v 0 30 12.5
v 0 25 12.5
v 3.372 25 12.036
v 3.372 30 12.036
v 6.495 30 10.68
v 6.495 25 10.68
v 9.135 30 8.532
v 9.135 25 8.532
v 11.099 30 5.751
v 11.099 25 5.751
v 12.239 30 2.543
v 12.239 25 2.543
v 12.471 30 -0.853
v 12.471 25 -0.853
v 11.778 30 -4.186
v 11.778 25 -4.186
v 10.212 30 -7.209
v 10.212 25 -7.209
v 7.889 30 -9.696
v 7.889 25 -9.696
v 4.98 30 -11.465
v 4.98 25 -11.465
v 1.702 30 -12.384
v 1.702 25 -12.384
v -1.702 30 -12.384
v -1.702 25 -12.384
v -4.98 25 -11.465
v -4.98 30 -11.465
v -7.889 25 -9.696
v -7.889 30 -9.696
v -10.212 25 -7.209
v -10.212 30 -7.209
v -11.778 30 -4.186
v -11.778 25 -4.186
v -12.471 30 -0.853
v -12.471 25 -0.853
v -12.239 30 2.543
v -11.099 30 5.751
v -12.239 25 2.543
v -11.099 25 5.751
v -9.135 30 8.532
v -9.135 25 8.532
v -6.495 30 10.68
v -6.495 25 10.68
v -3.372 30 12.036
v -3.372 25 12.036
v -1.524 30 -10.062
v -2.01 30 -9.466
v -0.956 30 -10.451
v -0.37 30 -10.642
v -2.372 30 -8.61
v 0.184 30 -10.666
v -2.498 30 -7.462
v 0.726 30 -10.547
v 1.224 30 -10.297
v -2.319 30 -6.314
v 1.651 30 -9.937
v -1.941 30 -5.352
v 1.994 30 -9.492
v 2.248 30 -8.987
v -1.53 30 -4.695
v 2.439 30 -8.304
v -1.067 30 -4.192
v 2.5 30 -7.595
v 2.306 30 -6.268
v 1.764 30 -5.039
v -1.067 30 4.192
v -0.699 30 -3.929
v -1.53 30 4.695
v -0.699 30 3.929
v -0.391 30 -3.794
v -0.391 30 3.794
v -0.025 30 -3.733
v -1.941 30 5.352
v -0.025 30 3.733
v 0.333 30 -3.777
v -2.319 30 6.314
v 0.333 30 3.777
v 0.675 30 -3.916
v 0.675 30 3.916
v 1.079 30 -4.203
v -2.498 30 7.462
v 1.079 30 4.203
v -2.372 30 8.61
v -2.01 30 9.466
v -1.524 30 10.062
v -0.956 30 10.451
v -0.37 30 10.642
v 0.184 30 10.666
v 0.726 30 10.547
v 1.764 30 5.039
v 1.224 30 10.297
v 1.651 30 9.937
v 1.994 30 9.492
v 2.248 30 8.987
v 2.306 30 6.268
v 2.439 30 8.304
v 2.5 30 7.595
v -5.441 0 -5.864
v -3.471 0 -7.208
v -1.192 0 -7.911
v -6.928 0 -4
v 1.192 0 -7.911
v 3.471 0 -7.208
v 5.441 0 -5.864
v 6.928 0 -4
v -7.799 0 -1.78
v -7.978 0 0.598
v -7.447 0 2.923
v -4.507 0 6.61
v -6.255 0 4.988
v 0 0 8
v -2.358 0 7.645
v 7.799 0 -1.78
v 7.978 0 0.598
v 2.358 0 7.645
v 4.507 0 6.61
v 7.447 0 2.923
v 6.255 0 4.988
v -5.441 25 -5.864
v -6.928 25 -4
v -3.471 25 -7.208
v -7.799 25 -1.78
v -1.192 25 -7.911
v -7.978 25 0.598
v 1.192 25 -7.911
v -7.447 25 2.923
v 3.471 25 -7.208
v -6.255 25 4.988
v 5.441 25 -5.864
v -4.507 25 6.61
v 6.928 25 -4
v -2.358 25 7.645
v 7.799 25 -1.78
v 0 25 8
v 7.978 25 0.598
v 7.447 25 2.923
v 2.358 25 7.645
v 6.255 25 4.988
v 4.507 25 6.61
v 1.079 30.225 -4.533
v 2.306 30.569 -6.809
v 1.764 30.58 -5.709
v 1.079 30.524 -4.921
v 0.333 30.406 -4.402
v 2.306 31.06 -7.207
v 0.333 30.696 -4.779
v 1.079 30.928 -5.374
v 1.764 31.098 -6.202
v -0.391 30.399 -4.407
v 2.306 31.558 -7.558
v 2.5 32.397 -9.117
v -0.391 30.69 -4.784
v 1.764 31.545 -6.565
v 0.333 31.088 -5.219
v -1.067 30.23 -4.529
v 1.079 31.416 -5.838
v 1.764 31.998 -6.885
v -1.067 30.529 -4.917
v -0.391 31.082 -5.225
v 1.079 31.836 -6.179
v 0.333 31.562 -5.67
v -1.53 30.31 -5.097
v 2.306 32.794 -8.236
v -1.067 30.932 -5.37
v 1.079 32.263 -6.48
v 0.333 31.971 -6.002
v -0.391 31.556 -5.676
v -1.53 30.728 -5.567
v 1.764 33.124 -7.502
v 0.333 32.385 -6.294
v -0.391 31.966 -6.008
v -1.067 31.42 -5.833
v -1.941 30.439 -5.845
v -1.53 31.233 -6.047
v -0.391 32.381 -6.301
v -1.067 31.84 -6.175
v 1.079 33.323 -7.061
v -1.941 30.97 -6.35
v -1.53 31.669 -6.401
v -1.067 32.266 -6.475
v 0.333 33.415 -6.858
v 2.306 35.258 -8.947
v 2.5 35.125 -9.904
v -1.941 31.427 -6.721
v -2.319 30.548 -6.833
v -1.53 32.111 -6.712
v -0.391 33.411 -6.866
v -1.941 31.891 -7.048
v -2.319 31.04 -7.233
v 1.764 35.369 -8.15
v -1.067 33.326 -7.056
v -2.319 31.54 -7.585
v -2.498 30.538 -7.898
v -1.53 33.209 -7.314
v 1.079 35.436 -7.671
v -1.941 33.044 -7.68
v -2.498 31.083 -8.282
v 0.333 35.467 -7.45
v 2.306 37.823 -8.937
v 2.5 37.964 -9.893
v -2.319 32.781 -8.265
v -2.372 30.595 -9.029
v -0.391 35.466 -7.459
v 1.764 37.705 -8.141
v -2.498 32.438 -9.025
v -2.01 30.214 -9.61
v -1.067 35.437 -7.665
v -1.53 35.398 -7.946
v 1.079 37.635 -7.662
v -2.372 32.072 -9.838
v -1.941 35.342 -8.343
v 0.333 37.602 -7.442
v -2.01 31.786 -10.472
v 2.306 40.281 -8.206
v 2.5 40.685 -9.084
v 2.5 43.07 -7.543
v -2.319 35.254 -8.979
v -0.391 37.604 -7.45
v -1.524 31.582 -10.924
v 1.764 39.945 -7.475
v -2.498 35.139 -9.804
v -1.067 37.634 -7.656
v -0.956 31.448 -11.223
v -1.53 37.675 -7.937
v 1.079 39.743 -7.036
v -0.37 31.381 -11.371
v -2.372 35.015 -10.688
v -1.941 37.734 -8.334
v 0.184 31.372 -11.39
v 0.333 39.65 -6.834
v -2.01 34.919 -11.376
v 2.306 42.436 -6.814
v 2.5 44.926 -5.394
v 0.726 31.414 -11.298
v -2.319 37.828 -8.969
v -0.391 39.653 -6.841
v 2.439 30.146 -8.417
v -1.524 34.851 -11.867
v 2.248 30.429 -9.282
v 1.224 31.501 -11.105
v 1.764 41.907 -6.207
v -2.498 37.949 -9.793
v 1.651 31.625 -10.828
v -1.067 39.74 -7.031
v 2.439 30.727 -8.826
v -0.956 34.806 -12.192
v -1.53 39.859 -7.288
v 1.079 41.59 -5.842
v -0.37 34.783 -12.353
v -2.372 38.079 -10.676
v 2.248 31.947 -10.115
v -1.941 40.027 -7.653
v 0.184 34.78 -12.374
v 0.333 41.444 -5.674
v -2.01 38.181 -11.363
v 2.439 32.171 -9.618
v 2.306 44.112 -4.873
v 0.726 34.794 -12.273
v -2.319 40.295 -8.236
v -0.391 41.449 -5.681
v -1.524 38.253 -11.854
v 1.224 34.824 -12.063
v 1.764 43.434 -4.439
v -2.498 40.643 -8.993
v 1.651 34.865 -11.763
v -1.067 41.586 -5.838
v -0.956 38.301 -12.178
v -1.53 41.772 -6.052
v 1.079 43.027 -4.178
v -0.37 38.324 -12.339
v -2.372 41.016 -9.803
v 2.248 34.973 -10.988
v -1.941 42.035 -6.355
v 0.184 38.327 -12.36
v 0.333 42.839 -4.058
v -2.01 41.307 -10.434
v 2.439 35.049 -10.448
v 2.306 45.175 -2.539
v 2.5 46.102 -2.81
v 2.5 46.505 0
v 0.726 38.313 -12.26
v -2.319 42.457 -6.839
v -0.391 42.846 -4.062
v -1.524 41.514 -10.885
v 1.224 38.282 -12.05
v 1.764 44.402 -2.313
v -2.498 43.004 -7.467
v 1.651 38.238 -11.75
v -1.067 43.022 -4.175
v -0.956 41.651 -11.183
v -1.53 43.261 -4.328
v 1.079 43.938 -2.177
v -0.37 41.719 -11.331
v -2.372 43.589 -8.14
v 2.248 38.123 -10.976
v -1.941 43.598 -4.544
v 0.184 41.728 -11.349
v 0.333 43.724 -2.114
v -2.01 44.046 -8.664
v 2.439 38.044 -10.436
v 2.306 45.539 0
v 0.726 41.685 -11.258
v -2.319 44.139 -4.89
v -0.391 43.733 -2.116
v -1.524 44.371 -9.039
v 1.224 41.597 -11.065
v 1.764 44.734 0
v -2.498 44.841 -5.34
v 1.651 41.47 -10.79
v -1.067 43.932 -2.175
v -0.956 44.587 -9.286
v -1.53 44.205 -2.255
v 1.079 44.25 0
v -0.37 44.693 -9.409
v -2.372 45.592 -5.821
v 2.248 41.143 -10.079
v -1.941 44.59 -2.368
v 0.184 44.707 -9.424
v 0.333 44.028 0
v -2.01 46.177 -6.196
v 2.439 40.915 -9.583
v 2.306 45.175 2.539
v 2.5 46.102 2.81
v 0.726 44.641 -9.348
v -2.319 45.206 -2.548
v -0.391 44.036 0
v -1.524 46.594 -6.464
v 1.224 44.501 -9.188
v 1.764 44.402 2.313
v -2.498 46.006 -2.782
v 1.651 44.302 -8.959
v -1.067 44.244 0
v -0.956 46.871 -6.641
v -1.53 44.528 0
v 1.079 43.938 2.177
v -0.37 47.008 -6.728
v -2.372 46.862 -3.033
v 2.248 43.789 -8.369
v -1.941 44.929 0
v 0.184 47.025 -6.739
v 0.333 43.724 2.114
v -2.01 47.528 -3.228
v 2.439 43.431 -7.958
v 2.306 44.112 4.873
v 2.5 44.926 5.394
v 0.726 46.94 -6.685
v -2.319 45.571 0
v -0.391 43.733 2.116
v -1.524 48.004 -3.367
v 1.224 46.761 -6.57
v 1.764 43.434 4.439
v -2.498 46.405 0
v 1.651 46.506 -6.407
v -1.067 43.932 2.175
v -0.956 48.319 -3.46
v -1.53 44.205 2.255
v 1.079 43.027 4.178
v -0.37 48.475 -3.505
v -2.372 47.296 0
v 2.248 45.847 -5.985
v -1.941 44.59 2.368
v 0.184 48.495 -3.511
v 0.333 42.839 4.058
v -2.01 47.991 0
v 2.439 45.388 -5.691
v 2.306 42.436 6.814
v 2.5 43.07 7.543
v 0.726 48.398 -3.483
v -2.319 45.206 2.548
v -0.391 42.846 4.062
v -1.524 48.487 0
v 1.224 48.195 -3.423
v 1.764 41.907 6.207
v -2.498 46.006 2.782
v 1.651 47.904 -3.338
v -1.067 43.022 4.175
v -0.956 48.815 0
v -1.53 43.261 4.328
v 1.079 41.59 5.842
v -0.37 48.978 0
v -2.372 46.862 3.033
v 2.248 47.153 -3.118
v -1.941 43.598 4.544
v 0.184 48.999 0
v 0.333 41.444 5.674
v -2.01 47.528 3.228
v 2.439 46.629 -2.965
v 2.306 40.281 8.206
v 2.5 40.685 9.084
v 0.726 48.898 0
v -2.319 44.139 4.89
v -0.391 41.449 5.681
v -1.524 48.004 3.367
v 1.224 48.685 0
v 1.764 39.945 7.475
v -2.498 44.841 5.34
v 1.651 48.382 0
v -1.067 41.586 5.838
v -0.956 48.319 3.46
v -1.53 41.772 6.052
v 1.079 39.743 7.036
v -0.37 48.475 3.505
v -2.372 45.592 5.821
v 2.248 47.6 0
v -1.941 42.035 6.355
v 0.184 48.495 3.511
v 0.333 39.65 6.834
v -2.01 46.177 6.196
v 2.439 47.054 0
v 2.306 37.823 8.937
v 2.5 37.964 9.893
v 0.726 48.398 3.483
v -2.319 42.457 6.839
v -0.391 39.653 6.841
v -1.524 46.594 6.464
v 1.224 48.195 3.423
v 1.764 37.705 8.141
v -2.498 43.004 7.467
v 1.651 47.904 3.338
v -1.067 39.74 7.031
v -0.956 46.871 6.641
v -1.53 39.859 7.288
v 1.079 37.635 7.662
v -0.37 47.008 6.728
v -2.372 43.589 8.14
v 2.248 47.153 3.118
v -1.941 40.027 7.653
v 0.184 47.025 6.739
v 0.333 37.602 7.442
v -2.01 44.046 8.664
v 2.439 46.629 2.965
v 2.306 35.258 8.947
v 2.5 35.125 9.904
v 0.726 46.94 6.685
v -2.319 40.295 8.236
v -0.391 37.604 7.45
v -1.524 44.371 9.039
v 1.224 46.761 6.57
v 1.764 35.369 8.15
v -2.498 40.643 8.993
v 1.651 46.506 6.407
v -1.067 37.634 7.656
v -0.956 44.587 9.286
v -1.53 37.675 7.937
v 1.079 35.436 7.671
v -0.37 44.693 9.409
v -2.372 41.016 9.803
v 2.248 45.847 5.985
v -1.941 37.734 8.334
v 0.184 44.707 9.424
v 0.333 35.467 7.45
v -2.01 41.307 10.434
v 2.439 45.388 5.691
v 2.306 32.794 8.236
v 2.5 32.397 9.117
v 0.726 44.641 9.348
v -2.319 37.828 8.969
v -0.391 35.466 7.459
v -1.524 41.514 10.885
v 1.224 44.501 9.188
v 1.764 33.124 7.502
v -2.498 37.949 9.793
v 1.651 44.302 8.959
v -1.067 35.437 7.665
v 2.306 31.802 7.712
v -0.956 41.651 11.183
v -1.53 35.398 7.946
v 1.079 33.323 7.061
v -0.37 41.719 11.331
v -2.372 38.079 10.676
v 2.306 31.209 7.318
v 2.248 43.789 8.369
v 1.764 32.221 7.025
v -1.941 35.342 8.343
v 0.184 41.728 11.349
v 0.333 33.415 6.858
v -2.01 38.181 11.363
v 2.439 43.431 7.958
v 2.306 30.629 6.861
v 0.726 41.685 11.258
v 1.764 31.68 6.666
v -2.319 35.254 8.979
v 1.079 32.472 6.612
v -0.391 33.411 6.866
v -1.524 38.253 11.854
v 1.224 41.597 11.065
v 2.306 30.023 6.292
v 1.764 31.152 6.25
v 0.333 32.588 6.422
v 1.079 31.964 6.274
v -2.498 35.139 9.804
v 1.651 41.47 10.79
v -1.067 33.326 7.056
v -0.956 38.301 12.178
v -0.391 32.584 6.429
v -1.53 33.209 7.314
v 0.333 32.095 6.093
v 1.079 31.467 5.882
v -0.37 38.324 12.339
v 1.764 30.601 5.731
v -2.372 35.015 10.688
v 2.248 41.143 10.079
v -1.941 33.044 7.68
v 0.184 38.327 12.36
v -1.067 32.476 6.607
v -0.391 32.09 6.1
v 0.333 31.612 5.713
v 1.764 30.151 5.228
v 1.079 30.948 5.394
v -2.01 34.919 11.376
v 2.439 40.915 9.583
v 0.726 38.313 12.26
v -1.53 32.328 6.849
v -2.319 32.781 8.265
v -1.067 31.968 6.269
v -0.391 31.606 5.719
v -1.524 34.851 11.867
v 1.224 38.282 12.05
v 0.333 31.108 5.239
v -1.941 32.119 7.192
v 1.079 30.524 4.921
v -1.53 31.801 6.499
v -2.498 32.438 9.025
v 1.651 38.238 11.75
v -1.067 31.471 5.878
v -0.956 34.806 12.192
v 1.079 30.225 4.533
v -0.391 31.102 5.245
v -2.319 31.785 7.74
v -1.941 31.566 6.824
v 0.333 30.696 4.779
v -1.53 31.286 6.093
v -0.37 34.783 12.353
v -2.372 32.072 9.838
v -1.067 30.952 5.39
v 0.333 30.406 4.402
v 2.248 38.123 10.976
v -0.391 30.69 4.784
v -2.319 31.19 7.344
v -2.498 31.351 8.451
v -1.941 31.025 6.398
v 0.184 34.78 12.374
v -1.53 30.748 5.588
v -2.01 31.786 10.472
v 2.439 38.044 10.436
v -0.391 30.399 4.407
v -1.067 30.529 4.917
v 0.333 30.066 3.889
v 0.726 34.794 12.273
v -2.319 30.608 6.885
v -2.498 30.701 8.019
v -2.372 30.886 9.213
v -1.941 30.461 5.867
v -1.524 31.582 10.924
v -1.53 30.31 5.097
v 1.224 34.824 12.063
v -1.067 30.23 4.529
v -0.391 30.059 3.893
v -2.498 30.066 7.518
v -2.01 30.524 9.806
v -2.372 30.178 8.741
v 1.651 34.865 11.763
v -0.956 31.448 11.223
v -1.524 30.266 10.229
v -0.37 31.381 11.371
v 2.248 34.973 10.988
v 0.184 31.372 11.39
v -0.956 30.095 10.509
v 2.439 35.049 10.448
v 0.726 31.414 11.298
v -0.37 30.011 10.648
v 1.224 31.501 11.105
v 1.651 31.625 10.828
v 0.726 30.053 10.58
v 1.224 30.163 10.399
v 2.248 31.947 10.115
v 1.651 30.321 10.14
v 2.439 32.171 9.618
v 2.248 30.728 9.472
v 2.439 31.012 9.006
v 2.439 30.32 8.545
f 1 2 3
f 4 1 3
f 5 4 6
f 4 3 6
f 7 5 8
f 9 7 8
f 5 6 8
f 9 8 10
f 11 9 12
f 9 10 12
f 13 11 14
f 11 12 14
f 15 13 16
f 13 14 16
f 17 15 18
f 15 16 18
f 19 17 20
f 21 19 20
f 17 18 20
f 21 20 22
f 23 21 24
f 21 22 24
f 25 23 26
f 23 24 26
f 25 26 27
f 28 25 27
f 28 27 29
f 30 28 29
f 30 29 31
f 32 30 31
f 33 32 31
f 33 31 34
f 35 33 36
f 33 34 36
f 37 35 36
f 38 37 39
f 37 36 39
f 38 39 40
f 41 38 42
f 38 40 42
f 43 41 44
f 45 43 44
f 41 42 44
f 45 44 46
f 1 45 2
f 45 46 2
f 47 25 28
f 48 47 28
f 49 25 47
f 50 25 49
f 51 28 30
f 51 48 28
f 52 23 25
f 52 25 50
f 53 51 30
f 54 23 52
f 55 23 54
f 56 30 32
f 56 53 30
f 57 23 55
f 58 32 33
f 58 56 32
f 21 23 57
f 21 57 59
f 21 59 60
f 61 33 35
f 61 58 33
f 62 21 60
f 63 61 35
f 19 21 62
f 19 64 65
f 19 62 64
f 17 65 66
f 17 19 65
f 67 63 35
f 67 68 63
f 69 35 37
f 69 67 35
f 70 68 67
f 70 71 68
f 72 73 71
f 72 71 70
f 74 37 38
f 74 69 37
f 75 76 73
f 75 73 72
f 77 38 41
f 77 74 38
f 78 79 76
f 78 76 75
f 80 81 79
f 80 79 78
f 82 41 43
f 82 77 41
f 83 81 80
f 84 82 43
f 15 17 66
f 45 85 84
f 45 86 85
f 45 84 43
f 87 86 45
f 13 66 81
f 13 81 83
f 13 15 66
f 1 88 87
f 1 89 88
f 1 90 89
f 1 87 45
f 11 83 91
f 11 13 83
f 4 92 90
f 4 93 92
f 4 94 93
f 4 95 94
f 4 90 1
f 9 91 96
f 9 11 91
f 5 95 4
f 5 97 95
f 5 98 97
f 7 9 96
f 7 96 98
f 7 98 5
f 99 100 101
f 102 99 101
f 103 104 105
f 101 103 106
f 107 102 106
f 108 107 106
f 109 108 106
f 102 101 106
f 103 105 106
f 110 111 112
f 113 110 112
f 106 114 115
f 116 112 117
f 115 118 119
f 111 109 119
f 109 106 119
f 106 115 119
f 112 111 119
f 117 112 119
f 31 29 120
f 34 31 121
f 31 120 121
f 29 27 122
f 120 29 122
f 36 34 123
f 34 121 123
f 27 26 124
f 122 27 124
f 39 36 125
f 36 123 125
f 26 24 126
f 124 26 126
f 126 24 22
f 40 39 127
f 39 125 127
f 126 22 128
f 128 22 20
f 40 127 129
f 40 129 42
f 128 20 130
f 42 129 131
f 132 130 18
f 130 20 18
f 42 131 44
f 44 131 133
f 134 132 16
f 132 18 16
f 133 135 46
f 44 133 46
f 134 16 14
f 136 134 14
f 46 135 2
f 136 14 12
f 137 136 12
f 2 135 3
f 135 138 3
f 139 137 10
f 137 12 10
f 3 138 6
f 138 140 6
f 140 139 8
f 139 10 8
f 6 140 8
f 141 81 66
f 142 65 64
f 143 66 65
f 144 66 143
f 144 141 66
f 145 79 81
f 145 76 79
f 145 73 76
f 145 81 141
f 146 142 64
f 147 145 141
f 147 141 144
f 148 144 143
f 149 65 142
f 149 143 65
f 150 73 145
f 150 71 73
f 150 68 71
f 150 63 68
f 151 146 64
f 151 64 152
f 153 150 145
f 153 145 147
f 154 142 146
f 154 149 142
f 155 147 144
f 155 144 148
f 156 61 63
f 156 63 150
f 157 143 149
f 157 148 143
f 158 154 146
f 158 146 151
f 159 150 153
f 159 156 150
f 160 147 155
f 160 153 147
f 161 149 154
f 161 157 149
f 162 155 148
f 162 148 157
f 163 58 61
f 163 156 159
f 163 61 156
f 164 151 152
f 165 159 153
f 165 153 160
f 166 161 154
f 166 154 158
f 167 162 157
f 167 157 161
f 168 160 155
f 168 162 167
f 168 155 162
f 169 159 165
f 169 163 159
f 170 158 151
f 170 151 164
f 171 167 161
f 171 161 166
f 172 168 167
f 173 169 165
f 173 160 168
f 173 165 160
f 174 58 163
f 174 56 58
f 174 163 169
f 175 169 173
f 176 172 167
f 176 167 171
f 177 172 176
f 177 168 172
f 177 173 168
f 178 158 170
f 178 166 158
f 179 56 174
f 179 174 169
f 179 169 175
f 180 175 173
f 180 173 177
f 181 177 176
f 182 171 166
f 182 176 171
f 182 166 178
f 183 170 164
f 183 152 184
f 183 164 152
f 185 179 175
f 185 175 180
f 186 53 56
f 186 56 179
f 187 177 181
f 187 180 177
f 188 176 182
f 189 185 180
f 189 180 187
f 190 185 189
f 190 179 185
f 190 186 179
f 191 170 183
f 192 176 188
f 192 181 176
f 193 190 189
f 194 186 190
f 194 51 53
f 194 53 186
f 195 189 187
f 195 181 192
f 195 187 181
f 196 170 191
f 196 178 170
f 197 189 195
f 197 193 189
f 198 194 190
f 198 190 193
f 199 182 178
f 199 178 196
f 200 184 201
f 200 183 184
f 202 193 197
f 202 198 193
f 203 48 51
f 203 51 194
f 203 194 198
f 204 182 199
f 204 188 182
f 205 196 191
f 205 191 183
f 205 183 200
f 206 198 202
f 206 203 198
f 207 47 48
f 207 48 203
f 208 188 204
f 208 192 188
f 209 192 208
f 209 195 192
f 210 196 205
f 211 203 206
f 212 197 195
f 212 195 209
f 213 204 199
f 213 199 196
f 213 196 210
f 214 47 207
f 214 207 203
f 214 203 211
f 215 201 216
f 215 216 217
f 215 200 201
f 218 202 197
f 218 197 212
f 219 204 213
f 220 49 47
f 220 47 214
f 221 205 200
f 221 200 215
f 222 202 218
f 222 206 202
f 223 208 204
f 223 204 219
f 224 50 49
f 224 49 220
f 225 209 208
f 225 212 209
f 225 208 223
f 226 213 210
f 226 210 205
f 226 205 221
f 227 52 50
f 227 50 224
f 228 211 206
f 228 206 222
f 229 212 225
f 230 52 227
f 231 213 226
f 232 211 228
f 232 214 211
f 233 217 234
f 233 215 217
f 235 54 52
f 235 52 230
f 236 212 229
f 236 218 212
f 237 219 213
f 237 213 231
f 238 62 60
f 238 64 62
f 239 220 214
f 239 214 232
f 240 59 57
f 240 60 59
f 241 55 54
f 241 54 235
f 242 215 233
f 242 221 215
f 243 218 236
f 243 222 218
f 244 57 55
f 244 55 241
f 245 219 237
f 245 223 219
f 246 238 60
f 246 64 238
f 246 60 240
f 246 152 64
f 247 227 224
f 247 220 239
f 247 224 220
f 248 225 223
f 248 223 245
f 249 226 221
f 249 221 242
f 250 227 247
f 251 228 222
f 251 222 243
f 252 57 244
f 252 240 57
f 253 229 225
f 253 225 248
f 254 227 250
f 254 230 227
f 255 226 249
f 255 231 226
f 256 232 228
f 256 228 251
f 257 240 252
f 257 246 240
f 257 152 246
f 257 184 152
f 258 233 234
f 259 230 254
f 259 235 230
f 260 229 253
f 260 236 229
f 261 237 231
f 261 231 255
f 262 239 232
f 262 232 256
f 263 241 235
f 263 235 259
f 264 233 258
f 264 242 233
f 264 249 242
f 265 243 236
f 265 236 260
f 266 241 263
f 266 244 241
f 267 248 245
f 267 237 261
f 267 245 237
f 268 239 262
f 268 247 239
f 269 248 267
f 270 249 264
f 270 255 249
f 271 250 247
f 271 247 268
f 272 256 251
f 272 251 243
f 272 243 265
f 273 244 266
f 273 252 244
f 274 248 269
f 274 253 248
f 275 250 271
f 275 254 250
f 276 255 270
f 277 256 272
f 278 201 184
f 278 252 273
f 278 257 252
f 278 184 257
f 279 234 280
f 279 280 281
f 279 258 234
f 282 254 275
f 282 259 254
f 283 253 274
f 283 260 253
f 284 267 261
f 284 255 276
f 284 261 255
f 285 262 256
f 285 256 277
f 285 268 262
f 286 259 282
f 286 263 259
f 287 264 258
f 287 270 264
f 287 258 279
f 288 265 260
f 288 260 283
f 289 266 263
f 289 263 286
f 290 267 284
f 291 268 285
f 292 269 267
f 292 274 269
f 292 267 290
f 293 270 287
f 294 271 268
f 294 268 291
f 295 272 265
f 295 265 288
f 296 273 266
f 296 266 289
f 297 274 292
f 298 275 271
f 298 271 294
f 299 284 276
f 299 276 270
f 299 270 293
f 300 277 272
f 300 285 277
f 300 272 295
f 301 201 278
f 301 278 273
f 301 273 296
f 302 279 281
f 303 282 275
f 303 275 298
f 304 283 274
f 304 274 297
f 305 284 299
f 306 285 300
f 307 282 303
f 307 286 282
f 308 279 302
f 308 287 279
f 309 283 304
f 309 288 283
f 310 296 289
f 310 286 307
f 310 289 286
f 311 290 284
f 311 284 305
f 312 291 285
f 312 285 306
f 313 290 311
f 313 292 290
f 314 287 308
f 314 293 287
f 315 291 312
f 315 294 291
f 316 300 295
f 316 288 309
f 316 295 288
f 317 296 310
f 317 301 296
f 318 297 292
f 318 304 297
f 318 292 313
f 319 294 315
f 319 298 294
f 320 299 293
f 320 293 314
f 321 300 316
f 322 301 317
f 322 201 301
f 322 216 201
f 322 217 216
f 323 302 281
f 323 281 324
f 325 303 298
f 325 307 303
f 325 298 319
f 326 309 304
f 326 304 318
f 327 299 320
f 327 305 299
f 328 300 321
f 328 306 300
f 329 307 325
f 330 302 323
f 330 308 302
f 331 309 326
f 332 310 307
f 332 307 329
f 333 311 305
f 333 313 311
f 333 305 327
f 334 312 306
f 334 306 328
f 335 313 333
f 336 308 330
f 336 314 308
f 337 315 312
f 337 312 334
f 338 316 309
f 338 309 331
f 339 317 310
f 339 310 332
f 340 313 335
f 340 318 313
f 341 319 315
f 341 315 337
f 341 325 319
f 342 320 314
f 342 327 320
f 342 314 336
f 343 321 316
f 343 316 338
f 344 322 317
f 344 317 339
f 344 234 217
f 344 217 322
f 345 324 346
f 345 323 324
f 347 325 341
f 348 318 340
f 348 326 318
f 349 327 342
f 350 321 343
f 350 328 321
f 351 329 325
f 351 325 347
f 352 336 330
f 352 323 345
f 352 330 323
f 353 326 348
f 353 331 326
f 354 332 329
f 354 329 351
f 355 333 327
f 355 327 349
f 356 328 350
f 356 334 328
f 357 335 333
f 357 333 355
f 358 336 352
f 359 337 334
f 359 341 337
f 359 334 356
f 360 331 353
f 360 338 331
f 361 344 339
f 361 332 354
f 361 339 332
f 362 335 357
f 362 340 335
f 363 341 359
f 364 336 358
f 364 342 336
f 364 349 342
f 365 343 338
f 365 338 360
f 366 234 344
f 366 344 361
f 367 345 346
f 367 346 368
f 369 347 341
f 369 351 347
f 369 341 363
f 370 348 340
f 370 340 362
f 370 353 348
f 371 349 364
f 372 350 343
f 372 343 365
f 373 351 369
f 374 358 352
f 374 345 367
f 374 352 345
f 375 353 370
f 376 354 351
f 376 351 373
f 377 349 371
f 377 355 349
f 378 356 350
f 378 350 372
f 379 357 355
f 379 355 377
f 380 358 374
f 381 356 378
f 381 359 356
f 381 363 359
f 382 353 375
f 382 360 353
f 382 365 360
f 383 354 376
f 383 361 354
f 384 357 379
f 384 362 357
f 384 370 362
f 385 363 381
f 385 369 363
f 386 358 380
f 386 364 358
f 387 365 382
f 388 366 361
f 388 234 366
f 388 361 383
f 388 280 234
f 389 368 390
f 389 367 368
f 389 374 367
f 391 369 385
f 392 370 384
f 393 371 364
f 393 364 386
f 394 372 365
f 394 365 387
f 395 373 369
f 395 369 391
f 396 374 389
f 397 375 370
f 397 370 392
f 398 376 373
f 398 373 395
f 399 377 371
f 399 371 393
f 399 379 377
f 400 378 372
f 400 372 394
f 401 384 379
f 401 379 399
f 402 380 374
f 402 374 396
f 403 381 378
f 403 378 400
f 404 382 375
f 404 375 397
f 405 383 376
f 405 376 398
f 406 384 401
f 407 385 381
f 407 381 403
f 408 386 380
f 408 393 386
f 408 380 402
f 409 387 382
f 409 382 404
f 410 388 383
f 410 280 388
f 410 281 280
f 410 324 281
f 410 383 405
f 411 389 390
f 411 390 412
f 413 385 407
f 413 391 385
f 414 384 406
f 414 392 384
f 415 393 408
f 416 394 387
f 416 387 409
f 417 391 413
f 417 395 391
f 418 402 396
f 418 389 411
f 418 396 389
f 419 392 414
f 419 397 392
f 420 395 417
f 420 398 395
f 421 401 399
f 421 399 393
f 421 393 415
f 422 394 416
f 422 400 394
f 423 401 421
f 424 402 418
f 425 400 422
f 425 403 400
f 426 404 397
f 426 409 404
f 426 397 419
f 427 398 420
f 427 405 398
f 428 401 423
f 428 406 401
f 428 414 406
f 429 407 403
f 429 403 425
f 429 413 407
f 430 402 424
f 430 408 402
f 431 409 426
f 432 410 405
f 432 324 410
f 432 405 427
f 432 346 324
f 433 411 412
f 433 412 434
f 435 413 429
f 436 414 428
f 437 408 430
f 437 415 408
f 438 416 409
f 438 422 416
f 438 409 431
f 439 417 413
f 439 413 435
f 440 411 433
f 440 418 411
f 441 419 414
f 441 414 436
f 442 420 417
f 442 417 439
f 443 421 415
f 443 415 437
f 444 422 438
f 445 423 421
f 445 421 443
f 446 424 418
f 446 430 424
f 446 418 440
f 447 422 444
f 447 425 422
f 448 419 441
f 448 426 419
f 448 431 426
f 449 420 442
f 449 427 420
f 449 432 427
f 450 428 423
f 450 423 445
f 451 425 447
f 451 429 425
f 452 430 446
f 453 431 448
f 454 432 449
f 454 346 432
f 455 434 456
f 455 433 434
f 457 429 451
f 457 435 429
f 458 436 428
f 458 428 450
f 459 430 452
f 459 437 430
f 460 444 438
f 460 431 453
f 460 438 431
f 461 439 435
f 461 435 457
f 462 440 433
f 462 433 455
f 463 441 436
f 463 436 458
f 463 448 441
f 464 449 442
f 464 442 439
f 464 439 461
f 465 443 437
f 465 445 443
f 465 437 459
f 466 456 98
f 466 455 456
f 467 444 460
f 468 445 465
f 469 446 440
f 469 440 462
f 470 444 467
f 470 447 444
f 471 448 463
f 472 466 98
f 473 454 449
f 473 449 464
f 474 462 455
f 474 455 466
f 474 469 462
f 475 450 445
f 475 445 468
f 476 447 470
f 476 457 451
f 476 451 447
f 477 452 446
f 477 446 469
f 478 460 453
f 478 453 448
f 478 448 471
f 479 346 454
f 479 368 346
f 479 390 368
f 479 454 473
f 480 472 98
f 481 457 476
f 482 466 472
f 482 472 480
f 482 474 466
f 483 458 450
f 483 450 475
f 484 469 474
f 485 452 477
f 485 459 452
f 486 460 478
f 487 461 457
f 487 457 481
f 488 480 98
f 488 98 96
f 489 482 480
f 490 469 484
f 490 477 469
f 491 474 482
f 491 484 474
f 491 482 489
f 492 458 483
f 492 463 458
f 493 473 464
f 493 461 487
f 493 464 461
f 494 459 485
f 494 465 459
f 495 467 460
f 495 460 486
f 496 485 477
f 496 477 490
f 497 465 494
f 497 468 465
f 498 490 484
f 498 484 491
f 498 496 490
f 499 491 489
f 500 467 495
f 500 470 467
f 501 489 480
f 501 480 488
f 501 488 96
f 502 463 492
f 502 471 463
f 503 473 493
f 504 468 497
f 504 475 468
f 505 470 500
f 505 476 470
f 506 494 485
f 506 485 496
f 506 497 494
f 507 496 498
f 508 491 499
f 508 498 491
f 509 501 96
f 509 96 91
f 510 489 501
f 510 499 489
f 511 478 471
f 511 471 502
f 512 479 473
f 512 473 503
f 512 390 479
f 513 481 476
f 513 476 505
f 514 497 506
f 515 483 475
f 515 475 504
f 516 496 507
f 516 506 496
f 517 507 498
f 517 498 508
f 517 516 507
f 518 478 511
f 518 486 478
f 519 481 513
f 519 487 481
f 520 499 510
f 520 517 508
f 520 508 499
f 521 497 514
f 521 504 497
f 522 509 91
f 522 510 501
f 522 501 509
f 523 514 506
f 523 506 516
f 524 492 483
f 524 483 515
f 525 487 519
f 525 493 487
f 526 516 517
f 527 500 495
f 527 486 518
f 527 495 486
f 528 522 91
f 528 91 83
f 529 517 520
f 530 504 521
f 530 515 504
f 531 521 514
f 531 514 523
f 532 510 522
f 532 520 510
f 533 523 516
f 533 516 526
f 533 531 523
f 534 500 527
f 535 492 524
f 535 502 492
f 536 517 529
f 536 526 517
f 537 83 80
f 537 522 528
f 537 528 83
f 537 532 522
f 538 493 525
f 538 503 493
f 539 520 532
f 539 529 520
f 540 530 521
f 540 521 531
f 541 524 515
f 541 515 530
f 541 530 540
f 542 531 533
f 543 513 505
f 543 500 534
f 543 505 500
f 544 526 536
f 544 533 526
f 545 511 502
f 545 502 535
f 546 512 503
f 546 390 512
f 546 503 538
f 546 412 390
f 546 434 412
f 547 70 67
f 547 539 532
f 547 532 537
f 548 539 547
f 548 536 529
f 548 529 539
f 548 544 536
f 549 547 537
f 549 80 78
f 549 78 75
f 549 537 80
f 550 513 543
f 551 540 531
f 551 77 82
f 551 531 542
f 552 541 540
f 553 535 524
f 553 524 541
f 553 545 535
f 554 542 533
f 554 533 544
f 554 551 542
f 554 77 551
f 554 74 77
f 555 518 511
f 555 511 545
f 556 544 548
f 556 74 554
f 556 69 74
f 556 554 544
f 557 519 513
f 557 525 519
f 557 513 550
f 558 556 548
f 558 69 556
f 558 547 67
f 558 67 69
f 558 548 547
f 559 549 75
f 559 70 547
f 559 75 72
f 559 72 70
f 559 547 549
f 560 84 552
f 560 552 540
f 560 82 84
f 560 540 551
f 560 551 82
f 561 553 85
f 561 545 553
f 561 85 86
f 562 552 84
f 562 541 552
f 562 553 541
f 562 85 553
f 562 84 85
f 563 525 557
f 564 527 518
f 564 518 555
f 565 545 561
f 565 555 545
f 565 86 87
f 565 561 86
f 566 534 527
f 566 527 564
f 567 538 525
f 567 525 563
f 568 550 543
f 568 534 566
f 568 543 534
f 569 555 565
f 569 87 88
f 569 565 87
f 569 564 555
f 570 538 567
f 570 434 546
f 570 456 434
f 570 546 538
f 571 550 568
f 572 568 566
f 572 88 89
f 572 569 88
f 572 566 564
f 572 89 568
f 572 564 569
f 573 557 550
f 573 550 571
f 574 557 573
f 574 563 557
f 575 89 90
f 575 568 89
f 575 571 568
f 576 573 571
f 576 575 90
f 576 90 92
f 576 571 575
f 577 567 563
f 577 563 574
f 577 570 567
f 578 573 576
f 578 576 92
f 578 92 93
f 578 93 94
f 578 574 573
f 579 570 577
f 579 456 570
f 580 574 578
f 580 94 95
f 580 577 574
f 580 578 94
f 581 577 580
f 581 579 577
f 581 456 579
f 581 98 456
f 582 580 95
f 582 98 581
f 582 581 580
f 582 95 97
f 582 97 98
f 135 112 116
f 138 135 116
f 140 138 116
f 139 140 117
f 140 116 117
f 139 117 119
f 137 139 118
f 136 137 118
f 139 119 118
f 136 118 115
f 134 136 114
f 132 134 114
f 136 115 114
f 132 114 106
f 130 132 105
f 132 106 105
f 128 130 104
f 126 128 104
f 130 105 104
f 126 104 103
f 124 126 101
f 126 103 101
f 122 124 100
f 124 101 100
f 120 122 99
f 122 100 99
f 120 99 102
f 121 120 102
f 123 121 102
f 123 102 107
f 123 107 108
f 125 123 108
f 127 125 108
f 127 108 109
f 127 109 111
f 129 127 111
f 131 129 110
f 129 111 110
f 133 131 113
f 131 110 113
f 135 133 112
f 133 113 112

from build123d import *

# Parameters (mm, degrees)
SKETCH1_R           = 8
BOSS_EXTRUDE1_DEPTH = 25
SKETCH2_R           = 12.5
BOSS_EXTRUDE2_DEPTH = 5
SKETCH4_R           = 2.5


with BuildPart() as part:
    # Sketch1 → Boss-Extrude1 (new body)
    with BuildSketch(Plane(origin=(0, 0, 0), x_dir=(1, 0, 0), z_dir=(0, 1, 0))):
        with Locations(Location((0, 0, 0), (0, 0, 270))):
            Circle(SKETCH1_R)
    extrude(amount=BOSS_EXTRUDE1_DEPTH)

    # Sketch2 → Boss-Extrude2 (add)
    with BuildSketch(Plane(origin=(0, 25, 0), x_dir=(1, 0, 0), z_dir=(0, 1, 0))):
        with Locations(Location((0, 0, 0), (0, 0, 270))):
            Circle(SKETCH2_R)
    extrude(amount=BOSS_EXTRUDE2_DEPTH)

    # Sweep1: sweep along a path in Sketch3
    with BuildLine(Plane(origin=(0, 0, 0), x_dir=(0, 0, -1), z_dir=(1, 0, 0))) as sweep1_path:
        ThreePointArc((4.961180913, 27.822787702), (-0.153256004, 46.504163807), (-4.692751062, 27.67481802))
    # Sketch4 → Sweep1 (sweep)
    with BuildSketch(Plane.XY):
        with Locations((0, 46.505338246)):
            Circle(SKETCH4_R)
    sweep(path=sweep1_path.line)


solid = part.part
